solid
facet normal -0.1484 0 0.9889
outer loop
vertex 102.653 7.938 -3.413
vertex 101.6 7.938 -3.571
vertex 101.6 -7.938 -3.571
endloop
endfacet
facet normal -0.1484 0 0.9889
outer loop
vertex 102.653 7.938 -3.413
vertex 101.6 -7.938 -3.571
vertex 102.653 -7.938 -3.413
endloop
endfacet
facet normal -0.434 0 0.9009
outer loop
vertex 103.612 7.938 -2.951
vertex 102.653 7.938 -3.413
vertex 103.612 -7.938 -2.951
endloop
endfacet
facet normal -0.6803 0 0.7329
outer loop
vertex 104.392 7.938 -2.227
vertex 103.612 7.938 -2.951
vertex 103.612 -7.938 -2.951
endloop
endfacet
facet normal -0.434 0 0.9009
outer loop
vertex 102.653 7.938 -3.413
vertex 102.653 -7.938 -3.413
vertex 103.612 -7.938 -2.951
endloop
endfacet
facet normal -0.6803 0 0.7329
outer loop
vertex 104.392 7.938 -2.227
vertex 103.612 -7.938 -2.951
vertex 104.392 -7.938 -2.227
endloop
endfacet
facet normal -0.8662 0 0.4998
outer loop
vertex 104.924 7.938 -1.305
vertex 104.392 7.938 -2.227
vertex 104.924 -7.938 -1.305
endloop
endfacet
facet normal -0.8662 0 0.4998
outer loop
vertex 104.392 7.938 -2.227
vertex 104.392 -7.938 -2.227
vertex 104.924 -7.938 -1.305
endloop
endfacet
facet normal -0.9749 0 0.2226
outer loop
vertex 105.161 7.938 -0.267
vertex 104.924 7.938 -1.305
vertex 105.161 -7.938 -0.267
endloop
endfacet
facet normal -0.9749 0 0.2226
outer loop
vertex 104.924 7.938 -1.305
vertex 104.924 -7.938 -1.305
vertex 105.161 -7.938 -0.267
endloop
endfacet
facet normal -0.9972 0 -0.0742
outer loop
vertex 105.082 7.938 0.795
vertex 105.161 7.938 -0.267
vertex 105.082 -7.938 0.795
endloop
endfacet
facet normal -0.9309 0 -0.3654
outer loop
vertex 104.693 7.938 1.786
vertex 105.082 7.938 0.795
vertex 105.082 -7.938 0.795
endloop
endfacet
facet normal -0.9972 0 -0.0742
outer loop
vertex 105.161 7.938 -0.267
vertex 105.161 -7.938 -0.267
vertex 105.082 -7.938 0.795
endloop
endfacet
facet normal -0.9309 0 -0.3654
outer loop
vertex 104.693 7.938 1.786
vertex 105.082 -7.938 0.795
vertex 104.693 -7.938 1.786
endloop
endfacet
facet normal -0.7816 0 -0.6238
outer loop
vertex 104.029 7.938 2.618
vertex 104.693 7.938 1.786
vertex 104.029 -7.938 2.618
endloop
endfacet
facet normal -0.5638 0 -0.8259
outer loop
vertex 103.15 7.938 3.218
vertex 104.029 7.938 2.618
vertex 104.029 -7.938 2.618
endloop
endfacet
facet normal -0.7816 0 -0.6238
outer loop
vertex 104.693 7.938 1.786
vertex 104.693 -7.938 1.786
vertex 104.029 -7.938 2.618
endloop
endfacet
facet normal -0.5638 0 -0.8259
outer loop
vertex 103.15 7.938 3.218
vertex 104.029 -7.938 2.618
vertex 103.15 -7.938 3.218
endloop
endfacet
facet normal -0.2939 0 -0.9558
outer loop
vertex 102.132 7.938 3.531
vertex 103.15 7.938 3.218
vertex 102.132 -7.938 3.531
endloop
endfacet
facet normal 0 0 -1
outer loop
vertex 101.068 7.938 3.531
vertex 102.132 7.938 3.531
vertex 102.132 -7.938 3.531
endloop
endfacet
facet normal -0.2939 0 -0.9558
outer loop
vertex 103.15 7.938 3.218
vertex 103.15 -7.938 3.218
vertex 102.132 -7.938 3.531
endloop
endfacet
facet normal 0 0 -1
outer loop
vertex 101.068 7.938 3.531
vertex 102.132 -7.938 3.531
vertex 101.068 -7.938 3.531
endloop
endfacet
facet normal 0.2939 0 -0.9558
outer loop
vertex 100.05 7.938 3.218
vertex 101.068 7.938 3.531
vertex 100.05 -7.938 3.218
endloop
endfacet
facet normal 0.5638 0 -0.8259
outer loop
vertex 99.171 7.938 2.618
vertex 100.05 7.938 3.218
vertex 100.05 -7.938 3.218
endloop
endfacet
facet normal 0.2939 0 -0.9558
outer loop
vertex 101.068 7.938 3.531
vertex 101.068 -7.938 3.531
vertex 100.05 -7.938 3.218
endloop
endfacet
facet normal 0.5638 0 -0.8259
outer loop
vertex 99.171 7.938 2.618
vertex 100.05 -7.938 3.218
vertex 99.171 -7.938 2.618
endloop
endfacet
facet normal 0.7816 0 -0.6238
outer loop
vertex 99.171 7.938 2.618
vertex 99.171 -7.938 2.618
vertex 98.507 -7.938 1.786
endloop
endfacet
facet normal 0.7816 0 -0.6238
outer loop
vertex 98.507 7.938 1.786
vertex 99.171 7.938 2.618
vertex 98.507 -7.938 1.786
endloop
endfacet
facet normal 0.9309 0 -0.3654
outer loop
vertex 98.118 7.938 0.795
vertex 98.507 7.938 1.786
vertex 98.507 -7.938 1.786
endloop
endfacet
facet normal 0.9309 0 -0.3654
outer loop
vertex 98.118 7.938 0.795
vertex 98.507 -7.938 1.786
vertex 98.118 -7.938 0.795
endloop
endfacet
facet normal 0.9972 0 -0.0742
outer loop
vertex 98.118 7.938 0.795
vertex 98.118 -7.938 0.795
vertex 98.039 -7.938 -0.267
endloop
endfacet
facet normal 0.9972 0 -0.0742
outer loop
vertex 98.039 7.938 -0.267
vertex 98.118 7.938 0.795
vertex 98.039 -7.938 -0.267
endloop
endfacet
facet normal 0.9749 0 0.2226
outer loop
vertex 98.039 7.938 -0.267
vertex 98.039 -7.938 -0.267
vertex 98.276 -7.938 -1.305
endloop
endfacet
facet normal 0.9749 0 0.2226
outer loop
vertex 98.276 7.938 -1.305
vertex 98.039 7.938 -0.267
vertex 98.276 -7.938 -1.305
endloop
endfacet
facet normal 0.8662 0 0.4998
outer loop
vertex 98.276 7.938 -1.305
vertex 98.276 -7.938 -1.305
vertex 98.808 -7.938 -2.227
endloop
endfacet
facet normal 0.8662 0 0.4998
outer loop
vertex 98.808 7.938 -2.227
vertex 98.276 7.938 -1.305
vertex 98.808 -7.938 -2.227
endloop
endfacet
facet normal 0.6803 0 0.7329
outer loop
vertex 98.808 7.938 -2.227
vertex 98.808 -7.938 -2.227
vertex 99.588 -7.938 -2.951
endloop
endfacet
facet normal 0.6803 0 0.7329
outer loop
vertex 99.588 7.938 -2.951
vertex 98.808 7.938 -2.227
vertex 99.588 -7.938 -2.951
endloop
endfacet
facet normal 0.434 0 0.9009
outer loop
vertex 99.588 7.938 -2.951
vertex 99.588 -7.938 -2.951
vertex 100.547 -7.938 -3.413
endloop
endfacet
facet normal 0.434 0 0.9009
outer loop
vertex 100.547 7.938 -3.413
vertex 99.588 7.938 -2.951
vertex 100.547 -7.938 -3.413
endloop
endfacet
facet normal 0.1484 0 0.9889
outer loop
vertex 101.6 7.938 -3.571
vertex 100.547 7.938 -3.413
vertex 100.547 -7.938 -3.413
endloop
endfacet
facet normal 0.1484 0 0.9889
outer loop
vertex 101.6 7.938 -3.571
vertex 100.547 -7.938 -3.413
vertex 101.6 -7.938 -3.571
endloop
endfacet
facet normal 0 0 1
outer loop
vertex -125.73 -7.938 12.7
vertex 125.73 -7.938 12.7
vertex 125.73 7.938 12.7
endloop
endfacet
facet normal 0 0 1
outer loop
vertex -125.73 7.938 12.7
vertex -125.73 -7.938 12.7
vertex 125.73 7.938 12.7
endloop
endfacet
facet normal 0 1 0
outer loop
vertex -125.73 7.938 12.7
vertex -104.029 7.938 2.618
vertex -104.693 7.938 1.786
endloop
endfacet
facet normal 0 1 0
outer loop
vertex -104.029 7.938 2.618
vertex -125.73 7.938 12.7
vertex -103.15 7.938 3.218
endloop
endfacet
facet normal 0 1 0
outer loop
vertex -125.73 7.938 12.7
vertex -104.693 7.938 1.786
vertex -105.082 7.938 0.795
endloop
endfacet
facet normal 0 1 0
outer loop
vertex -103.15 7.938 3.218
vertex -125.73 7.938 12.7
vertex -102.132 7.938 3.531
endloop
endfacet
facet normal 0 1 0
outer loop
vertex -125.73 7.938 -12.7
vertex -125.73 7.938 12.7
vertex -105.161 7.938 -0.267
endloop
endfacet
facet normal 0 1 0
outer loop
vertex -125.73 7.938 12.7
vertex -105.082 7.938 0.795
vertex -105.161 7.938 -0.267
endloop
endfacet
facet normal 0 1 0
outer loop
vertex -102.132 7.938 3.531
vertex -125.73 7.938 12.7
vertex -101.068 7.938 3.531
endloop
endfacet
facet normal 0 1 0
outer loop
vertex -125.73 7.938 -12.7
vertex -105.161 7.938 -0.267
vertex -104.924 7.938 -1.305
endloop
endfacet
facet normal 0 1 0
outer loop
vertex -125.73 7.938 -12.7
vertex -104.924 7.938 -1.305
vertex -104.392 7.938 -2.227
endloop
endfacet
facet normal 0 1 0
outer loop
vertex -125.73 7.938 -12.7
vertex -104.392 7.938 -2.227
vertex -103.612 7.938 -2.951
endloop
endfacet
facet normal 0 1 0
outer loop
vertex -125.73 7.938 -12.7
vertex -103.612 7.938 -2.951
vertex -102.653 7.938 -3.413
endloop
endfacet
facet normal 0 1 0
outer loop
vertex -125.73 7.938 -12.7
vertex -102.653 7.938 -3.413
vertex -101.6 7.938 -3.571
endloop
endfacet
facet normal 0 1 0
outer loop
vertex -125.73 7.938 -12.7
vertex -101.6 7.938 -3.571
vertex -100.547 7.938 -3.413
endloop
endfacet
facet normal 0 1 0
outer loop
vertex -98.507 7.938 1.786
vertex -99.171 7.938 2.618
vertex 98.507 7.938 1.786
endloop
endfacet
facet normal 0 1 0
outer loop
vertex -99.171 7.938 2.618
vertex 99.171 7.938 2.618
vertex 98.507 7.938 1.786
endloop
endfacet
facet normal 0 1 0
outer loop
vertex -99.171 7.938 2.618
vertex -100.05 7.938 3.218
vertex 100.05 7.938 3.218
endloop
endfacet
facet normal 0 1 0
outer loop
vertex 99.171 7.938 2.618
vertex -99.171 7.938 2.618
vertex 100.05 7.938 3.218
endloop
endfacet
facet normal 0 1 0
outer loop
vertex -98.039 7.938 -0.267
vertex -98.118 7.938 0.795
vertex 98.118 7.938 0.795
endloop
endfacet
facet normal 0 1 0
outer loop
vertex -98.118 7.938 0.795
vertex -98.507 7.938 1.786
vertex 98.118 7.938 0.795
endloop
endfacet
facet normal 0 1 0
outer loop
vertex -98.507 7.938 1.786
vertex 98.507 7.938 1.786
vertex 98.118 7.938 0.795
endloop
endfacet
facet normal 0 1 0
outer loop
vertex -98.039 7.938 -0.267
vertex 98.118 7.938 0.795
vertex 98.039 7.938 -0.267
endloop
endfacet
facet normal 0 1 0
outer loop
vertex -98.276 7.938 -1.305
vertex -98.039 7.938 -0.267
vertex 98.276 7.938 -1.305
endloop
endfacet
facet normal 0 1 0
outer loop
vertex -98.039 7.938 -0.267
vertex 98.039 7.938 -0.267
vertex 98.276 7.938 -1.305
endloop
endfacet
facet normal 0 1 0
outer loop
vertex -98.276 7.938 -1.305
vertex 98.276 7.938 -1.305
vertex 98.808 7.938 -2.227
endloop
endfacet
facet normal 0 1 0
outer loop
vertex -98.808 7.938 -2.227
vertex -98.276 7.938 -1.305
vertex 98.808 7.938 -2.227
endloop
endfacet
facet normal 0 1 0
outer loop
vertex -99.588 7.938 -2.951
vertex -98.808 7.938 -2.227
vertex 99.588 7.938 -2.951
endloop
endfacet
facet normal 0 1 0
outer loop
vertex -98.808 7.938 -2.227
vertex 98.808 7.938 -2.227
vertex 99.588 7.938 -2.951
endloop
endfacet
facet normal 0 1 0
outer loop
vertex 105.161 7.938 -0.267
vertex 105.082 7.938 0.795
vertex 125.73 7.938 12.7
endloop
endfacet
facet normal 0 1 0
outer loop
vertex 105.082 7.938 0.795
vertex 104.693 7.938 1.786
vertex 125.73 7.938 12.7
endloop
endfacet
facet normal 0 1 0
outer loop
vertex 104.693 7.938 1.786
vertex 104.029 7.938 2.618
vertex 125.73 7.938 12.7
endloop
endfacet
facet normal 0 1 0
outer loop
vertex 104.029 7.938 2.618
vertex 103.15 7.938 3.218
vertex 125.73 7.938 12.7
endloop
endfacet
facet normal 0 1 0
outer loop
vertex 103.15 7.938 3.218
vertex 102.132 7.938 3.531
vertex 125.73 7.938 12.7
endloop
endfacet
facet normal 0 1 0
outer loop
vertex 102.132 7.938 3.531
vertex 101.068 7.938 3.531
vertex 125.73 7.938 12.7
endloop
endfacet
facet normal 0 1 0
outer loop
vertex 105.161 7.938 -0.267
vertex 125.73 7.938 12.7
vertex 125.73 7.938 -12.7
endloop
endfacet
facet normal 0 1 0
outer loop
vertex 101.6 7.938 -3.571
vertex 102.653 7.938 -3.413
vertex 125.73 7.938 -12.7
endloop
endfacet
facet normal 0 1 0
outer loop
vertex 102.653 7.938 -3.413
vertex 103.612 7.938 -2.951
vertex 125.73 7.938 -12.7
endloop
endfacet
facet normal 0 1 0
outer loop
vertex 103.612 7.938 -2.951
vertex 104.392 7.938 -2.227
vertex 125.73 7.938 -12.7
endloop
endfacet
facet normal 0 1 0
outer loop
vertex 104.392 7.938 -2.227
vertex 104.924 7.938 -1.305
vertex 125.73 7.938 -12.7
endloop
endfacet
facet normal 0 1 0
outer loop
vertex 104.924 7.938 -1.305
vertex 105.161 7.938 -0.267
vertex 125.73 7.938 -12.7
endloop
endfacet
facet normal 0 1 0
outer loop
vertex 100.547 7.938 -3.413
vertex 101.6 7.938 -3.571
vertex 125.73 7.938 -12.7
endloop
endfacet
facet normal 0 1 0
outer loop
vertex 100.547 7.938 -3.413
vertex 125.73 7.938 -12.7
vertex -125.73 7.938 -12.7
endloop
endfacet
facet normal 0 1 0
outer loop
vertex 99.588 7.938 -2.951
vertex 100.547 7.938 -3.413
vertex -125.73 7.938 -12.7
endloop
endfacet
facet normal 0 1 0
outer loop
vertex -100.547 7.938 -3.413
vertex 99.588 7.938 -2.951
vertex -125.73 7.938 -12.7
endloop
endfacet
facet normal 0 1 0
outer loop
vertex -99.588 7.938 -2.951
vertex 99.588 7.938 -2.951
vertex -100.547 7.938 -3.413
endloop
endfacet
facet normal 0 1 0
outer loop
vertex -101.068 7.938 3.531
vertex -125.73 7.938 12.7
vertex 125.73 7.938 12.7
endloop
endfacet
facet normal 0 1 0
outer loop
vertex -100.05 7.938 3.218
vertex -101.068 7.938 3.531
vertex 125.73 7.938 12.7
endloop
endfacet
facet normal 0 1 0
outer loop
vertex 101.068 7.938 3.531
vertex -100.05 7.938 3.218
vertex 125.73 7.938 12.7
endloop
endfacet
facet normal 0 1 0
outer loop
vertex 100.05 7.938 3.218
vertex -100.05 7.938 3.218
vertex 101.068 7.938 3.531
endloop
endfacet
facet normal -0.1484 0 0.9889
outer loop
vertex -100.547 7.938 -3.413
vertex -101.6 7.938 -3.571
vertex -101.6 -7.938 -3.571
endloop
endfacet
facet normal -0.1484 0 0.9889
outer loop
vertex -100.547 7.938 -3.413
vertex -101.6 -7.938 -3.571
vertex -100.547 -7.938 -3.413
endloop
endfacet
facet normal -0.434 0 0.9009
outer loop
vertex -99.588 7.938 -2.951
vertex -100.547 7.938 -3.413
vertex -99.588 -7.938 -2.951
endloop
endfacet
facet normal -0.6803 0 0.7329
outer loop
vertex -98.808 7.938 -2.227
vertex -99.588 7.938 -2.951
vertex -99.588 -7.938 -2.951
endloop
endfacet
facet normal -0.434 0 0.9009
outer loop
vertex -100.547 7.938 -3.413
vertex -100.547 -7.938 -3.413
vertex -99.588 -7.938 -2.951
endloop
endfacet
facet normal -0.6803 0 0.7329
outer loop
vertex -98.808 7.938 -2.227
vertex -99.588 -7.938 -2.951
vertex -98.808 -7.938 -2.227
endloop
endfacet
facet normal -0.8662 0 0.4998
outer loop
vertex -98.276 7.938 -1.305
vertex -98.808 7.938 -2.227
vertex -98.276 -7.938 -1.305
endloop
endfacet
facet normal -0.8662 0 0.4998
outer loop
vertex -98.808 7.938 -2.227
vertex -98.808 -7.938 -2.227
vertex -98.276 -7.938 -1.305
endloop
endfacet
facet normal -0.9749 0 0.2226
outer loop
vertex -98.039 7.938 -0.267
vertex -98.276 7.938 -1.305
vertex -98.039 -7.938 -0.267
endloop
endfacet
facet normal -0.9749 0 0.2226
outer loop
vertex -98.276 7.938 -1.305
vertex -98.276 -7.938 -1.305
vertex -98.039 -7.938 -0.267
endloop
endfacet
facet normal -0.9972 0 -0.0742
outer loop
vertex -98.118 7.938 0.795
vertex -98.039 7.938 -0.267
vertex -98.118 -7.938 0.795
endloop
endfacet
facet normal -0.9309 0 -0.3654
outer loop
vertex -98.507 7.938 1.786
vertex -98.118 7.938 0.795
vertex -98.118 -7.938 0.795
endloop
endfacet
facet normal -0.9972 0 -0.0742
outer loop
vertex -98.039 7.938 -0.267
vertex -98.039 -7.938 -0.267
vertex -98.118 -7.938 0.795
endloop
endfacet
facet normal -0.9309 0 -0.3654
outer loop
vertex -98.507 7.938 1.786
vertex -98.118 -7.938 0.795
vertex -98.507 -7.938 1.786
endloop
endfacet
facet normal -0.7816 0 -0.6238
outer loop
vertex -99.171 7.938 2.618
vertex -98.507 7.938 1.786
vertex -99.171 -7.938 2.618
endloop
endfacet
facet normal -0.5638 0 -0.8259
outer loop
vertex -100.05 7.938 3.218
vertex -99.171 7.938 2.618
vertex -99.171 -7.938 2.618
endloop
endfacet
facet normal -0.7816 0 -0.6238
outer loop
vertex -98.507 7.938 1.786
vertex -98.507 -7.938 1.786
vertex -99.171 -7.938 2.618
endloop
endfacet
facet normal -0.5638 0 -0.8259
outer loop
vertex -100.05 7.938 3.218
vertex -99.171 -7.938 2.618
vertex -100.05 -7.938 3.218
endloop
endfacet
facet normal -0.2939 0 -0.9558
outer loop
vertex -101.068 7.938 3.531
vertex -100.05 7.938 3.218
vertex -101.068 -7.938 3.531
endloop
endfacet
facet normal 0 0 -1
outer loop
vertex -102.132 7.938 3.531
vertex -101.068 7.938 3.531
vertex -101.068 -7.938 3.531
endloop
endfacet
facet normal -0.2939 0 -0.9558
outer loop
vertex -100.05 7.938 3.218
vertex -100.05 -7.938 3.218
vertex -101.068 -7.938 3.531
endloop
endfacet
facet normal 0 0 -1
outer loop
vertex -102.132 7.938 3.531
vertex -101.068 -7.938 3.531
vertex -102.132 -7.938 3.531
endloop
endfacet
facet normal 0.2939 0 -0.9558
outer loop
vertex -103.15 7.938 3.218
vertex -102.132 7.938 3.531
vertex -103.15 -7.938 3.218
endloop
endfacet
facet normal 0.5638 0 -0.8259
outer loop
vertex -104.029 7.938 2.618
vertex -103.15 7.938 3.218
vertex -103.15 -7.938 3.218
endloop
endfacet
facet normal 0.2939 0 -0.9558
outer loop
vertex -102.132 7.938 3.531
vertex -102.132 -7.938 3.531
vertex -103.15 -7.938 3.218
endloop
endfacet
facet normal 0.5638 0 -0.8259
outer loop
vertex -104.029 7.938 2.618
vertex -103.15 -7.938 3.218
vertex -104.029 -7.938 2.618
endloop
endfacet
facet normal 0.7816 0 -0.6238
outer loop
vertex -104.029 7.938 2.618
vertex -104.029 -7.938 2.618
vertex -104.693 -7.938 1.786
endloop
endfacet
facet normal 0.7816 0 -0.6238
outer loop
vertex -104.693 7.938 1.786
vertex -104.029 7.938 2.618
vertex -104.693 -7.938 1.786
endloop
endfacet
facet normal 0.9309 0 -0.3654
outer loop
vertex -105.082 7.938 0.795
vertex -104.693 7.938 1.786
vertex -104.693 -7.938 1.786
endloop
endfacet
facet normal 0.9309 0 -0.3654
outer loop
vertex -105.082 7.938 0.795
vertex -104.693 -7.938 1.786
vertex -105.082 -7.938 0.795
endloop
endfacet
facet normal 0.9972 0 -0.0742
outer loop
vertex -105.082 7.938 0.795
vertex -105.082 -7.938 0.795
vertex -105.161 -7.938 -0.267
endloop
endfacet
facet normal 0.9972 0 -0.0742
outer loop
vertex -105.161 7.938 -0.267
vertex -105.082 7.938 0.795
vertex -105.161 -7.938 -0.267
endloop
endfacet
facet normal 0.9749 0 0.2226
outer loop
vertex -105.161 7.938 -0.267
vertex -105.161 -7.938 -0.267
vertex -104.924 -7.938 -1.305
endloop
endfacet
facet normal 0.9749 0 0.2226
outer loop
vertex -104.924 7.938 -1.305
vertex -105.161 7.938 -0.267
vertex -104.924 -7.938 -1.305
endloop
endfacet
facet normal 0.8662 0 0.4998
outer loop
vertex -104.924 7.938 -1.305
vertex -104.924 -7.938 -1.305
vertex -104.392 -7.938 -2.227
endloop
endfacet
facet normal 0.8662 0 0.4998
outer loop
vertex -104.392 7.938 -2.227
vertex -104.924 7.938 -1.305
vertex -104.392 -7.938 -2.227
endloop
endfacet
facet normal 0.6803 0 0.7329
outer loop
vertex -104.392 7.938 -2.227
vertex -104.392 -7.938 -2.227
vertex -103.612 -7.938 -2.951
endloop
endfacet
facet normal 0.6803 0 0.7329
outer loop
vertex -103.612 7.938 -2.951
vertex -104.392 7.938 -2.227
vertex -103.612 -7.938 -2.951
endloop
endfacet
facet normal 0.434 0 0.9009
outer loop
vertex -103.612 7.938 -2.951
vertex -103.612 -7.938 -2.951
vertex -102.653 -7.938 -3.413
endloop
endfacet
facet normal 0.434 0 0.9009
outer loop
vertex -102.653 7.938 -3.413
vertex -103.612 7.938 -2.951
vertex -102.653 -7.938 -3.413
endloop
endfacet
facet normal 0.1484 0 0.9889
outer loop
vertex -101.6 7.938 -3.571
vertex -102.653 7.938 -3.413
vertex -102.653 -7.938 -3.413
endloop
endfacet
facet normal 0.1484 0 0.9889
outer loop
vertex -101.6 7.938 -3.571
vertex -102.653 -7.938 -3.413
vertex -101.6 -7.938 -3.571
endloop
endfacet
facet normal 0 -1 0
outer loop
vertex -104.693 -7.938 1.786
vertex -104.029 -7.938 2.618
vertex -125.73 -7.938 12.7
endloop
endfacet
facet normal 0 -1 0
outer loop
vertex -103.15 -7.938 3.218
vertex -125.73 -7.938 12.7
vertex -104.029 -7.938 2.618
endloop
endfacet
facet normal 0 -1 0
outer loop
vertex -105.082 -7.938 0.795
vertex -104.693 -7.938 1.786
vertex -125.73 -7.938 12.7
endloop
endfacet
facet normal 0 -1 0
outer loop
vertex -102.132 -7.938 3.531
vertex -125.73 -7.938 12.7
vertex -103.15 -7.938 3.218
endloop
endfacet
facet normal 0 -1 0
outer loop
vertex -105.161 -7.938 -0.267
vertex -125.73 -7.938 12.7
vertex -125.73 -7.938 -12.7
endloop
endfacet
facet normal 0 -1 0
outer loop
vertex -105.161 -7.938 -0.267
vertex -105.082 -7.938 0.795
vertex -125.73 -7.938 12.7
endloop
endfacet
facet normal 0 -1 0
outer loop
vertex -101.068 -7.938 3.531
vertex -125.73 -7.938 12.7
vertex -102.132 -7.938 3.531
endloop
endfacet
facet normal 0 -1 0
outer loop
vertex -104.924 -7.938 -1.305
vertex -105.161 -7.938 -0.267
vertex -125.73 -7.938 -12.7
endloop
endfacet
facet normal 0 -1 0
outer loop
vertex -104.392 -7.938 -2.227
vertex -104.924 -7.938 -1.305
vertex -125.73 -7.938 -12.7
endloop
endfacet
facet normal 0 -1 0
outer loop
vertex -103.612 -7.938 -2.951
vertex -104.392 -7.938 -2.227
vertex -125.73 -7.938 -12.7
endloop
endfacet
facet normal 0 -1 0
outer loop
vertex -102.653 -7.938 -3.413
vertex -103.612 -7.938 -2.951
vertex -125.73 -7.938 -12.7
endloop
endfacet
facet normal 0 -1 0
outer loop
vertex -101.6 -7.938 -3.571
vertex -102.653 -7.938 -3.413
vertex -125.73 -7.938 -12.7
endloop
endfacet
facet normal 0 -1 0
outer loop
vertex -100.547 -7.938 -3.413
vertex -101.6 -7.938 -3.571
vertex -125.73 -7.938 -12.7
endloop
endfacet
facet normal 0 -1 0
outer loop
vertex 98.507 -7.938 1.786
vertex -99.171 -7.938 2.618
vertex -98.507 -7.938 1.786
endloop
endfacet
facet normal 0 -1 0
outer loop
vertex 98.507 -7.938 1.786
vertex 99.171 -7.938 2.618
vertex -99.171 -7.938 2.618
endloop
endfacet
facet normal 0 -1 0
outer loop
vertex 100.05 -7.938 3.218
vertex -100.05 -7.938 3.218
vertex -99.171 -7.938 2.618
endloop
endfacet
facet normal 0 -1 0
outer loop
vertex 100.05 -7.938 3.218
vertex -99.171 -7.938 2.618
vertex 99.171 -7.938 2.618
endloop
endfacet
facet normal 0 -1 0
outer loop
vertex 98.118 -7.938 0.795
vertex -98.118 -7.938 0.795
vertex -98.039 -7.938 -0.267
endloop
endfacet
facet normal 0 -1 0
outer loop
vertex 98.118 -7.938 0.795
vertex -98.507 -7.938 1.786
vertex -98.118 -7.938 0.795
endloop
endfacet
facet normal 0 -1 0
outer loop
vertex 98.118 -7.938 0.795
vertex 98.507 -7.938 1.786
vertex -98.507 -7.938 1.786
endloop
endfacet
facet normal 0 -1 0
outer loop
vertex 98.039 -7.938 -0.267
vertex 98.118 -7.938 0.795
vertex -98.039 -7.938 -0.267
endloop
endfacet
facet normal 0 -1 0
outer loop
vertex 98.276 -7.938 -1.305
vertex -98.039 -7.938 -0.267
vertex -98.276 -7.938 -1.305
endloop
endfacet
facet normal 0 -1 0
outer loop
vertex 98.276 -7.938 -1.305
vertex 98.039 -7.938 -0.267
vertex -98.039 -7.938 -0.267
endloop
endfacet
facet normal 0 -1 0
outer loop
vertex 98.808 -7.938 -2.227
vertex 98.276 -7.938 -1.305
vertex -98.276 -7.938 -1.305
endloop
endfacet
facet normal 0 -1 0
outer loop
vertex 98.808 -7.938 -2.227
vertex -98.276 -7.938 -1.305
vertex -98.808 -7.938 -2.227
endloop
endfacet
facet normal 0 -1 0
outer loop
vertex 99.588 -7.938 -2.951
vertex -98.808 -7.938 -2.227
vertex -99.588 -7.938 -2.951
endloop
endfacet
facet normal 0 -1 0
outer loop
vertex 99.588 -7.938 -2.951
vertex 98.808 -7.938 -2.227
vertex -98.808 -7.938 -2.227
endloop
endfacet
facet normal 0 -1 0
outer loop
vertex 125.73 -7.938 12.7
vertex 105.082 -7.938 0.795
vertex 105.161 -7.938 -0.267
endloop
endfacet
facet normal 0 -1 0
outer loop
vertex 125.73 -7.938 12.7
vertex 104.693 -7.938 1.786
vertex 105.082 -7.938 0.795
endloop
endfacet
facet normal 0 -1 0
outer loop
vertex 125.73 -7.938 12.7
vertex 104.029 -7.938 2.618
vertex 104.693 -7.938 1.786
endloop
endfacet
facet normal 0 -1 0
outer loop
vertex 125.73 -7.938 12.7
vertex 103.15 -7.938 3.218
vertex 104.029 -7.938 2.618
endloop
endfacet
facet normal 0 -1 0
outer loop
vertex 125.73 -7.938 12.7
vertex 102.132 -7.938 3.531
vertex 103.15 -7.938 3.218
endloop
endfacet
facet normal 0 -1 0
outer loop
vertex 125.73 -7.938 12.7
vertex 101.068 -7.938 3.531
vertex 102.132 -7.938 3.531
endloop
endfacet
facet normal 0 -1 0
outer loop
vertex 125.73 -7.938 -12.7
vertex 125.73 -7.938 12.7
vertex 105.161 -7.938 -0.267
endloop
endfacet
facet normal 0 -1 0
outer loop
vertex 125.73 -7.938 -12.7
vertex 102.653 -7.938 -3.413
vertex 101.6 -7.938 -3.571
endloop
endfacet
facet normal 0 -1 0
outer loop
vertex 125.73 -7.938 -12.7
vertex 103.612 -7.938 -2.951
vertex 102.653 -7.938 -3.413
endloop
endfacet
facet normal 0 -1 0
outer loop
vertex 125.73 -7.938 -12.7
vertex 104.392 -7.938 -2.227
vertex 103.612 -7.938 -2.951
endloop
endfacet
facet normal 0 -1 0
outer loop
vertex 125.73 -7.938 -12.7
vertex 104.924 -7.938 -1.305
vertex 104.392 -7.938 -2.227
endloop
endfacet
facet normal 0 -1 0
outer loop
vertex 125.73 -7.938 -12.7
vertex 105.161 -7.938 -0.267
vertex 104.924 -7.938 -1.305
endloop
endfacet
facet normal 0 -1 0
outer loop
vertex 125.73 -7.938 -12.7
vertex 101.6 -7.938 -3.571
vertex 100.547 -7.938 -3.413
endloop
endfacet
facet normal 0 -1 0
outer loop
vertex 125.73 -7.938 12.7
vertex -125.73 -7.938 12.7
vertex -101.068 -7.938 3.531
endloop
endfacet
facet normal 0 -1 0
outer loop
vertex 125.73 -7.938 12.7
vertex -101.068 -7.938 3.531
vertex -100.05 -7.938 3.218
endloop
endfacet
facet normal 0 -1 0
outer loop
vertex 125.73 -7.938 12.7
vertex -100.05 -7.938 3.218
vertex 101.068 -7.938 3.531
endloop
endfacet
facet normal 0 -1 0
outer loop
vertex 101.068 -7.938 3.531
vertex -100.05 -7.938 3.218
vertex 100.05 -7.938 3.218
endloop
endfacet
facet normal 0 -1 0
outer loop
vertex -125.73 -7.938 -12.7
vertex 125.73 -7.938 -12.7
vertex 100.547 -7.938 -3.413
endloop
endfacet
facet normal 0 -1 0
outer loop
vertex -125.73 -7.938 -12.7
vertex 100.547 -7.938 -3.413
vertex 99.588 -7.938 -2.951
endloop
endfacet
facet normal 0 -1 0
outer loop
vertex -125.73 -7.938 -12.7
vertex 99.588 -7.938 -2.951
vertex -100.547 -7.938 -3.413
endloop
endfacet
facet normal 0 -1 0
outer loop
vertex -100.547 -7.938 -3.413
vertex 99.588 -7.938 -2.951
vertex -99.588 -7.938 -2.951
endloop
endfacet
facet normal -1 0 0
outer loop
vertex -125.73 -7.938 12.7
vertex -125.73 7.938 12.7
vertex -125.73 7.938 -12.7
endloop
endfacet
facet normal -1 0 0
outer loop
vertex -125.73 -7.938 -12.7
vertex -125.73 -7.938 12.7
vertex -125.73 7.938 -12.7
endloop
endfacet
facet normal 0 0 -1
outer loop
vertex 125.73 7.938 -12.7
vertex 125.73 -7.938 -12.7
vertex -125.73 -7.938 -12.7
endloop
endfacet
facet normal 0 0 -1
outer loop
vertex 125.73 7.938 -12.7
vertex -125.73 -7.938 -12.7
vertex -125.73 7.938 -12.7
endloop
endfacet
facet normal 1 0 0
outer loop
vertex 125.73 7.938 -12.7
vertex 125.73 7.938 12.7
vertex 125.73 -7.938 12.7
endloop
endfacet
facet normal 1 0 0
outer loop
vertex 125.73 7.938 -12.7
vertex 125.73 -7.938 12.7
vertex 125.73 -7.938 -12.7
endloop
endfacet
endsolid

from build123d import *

# Parameters (mm, degrees)
SKETCH3_W               = 25.4
SKETCH3_H               = 15.875
EXTRUDE2_DEPTH          = 125.73
F_1_4_CLEARANCE_HOLE1_D = 7.14248


with BuildPart() as part:
    # Sketch3 → Extrude2 (new, symmetric)
    with BuildSketch(Plane(origin=(0, 0, 0), x_dir=(0, 0, -1), z_dir=(1, 0, 0))):
        Rectangle(SKETCH3_W, SKETCH3_H)
    extrude(amount=EXTRUDE2_DEPTH, both=True)

    # 1/4 Clearance Hole1 (through all)
    with Locations(Plane(origin=(101.6, 7.9375, 0), x_dir=(0, 0, 1), z_dir=(0, 1, 0))):
        with Locations((0, 0), (0, -203.2)):
            Hole(F_1_4_CLEARANCE_HOLE1_D / 2)


solid = part.part
